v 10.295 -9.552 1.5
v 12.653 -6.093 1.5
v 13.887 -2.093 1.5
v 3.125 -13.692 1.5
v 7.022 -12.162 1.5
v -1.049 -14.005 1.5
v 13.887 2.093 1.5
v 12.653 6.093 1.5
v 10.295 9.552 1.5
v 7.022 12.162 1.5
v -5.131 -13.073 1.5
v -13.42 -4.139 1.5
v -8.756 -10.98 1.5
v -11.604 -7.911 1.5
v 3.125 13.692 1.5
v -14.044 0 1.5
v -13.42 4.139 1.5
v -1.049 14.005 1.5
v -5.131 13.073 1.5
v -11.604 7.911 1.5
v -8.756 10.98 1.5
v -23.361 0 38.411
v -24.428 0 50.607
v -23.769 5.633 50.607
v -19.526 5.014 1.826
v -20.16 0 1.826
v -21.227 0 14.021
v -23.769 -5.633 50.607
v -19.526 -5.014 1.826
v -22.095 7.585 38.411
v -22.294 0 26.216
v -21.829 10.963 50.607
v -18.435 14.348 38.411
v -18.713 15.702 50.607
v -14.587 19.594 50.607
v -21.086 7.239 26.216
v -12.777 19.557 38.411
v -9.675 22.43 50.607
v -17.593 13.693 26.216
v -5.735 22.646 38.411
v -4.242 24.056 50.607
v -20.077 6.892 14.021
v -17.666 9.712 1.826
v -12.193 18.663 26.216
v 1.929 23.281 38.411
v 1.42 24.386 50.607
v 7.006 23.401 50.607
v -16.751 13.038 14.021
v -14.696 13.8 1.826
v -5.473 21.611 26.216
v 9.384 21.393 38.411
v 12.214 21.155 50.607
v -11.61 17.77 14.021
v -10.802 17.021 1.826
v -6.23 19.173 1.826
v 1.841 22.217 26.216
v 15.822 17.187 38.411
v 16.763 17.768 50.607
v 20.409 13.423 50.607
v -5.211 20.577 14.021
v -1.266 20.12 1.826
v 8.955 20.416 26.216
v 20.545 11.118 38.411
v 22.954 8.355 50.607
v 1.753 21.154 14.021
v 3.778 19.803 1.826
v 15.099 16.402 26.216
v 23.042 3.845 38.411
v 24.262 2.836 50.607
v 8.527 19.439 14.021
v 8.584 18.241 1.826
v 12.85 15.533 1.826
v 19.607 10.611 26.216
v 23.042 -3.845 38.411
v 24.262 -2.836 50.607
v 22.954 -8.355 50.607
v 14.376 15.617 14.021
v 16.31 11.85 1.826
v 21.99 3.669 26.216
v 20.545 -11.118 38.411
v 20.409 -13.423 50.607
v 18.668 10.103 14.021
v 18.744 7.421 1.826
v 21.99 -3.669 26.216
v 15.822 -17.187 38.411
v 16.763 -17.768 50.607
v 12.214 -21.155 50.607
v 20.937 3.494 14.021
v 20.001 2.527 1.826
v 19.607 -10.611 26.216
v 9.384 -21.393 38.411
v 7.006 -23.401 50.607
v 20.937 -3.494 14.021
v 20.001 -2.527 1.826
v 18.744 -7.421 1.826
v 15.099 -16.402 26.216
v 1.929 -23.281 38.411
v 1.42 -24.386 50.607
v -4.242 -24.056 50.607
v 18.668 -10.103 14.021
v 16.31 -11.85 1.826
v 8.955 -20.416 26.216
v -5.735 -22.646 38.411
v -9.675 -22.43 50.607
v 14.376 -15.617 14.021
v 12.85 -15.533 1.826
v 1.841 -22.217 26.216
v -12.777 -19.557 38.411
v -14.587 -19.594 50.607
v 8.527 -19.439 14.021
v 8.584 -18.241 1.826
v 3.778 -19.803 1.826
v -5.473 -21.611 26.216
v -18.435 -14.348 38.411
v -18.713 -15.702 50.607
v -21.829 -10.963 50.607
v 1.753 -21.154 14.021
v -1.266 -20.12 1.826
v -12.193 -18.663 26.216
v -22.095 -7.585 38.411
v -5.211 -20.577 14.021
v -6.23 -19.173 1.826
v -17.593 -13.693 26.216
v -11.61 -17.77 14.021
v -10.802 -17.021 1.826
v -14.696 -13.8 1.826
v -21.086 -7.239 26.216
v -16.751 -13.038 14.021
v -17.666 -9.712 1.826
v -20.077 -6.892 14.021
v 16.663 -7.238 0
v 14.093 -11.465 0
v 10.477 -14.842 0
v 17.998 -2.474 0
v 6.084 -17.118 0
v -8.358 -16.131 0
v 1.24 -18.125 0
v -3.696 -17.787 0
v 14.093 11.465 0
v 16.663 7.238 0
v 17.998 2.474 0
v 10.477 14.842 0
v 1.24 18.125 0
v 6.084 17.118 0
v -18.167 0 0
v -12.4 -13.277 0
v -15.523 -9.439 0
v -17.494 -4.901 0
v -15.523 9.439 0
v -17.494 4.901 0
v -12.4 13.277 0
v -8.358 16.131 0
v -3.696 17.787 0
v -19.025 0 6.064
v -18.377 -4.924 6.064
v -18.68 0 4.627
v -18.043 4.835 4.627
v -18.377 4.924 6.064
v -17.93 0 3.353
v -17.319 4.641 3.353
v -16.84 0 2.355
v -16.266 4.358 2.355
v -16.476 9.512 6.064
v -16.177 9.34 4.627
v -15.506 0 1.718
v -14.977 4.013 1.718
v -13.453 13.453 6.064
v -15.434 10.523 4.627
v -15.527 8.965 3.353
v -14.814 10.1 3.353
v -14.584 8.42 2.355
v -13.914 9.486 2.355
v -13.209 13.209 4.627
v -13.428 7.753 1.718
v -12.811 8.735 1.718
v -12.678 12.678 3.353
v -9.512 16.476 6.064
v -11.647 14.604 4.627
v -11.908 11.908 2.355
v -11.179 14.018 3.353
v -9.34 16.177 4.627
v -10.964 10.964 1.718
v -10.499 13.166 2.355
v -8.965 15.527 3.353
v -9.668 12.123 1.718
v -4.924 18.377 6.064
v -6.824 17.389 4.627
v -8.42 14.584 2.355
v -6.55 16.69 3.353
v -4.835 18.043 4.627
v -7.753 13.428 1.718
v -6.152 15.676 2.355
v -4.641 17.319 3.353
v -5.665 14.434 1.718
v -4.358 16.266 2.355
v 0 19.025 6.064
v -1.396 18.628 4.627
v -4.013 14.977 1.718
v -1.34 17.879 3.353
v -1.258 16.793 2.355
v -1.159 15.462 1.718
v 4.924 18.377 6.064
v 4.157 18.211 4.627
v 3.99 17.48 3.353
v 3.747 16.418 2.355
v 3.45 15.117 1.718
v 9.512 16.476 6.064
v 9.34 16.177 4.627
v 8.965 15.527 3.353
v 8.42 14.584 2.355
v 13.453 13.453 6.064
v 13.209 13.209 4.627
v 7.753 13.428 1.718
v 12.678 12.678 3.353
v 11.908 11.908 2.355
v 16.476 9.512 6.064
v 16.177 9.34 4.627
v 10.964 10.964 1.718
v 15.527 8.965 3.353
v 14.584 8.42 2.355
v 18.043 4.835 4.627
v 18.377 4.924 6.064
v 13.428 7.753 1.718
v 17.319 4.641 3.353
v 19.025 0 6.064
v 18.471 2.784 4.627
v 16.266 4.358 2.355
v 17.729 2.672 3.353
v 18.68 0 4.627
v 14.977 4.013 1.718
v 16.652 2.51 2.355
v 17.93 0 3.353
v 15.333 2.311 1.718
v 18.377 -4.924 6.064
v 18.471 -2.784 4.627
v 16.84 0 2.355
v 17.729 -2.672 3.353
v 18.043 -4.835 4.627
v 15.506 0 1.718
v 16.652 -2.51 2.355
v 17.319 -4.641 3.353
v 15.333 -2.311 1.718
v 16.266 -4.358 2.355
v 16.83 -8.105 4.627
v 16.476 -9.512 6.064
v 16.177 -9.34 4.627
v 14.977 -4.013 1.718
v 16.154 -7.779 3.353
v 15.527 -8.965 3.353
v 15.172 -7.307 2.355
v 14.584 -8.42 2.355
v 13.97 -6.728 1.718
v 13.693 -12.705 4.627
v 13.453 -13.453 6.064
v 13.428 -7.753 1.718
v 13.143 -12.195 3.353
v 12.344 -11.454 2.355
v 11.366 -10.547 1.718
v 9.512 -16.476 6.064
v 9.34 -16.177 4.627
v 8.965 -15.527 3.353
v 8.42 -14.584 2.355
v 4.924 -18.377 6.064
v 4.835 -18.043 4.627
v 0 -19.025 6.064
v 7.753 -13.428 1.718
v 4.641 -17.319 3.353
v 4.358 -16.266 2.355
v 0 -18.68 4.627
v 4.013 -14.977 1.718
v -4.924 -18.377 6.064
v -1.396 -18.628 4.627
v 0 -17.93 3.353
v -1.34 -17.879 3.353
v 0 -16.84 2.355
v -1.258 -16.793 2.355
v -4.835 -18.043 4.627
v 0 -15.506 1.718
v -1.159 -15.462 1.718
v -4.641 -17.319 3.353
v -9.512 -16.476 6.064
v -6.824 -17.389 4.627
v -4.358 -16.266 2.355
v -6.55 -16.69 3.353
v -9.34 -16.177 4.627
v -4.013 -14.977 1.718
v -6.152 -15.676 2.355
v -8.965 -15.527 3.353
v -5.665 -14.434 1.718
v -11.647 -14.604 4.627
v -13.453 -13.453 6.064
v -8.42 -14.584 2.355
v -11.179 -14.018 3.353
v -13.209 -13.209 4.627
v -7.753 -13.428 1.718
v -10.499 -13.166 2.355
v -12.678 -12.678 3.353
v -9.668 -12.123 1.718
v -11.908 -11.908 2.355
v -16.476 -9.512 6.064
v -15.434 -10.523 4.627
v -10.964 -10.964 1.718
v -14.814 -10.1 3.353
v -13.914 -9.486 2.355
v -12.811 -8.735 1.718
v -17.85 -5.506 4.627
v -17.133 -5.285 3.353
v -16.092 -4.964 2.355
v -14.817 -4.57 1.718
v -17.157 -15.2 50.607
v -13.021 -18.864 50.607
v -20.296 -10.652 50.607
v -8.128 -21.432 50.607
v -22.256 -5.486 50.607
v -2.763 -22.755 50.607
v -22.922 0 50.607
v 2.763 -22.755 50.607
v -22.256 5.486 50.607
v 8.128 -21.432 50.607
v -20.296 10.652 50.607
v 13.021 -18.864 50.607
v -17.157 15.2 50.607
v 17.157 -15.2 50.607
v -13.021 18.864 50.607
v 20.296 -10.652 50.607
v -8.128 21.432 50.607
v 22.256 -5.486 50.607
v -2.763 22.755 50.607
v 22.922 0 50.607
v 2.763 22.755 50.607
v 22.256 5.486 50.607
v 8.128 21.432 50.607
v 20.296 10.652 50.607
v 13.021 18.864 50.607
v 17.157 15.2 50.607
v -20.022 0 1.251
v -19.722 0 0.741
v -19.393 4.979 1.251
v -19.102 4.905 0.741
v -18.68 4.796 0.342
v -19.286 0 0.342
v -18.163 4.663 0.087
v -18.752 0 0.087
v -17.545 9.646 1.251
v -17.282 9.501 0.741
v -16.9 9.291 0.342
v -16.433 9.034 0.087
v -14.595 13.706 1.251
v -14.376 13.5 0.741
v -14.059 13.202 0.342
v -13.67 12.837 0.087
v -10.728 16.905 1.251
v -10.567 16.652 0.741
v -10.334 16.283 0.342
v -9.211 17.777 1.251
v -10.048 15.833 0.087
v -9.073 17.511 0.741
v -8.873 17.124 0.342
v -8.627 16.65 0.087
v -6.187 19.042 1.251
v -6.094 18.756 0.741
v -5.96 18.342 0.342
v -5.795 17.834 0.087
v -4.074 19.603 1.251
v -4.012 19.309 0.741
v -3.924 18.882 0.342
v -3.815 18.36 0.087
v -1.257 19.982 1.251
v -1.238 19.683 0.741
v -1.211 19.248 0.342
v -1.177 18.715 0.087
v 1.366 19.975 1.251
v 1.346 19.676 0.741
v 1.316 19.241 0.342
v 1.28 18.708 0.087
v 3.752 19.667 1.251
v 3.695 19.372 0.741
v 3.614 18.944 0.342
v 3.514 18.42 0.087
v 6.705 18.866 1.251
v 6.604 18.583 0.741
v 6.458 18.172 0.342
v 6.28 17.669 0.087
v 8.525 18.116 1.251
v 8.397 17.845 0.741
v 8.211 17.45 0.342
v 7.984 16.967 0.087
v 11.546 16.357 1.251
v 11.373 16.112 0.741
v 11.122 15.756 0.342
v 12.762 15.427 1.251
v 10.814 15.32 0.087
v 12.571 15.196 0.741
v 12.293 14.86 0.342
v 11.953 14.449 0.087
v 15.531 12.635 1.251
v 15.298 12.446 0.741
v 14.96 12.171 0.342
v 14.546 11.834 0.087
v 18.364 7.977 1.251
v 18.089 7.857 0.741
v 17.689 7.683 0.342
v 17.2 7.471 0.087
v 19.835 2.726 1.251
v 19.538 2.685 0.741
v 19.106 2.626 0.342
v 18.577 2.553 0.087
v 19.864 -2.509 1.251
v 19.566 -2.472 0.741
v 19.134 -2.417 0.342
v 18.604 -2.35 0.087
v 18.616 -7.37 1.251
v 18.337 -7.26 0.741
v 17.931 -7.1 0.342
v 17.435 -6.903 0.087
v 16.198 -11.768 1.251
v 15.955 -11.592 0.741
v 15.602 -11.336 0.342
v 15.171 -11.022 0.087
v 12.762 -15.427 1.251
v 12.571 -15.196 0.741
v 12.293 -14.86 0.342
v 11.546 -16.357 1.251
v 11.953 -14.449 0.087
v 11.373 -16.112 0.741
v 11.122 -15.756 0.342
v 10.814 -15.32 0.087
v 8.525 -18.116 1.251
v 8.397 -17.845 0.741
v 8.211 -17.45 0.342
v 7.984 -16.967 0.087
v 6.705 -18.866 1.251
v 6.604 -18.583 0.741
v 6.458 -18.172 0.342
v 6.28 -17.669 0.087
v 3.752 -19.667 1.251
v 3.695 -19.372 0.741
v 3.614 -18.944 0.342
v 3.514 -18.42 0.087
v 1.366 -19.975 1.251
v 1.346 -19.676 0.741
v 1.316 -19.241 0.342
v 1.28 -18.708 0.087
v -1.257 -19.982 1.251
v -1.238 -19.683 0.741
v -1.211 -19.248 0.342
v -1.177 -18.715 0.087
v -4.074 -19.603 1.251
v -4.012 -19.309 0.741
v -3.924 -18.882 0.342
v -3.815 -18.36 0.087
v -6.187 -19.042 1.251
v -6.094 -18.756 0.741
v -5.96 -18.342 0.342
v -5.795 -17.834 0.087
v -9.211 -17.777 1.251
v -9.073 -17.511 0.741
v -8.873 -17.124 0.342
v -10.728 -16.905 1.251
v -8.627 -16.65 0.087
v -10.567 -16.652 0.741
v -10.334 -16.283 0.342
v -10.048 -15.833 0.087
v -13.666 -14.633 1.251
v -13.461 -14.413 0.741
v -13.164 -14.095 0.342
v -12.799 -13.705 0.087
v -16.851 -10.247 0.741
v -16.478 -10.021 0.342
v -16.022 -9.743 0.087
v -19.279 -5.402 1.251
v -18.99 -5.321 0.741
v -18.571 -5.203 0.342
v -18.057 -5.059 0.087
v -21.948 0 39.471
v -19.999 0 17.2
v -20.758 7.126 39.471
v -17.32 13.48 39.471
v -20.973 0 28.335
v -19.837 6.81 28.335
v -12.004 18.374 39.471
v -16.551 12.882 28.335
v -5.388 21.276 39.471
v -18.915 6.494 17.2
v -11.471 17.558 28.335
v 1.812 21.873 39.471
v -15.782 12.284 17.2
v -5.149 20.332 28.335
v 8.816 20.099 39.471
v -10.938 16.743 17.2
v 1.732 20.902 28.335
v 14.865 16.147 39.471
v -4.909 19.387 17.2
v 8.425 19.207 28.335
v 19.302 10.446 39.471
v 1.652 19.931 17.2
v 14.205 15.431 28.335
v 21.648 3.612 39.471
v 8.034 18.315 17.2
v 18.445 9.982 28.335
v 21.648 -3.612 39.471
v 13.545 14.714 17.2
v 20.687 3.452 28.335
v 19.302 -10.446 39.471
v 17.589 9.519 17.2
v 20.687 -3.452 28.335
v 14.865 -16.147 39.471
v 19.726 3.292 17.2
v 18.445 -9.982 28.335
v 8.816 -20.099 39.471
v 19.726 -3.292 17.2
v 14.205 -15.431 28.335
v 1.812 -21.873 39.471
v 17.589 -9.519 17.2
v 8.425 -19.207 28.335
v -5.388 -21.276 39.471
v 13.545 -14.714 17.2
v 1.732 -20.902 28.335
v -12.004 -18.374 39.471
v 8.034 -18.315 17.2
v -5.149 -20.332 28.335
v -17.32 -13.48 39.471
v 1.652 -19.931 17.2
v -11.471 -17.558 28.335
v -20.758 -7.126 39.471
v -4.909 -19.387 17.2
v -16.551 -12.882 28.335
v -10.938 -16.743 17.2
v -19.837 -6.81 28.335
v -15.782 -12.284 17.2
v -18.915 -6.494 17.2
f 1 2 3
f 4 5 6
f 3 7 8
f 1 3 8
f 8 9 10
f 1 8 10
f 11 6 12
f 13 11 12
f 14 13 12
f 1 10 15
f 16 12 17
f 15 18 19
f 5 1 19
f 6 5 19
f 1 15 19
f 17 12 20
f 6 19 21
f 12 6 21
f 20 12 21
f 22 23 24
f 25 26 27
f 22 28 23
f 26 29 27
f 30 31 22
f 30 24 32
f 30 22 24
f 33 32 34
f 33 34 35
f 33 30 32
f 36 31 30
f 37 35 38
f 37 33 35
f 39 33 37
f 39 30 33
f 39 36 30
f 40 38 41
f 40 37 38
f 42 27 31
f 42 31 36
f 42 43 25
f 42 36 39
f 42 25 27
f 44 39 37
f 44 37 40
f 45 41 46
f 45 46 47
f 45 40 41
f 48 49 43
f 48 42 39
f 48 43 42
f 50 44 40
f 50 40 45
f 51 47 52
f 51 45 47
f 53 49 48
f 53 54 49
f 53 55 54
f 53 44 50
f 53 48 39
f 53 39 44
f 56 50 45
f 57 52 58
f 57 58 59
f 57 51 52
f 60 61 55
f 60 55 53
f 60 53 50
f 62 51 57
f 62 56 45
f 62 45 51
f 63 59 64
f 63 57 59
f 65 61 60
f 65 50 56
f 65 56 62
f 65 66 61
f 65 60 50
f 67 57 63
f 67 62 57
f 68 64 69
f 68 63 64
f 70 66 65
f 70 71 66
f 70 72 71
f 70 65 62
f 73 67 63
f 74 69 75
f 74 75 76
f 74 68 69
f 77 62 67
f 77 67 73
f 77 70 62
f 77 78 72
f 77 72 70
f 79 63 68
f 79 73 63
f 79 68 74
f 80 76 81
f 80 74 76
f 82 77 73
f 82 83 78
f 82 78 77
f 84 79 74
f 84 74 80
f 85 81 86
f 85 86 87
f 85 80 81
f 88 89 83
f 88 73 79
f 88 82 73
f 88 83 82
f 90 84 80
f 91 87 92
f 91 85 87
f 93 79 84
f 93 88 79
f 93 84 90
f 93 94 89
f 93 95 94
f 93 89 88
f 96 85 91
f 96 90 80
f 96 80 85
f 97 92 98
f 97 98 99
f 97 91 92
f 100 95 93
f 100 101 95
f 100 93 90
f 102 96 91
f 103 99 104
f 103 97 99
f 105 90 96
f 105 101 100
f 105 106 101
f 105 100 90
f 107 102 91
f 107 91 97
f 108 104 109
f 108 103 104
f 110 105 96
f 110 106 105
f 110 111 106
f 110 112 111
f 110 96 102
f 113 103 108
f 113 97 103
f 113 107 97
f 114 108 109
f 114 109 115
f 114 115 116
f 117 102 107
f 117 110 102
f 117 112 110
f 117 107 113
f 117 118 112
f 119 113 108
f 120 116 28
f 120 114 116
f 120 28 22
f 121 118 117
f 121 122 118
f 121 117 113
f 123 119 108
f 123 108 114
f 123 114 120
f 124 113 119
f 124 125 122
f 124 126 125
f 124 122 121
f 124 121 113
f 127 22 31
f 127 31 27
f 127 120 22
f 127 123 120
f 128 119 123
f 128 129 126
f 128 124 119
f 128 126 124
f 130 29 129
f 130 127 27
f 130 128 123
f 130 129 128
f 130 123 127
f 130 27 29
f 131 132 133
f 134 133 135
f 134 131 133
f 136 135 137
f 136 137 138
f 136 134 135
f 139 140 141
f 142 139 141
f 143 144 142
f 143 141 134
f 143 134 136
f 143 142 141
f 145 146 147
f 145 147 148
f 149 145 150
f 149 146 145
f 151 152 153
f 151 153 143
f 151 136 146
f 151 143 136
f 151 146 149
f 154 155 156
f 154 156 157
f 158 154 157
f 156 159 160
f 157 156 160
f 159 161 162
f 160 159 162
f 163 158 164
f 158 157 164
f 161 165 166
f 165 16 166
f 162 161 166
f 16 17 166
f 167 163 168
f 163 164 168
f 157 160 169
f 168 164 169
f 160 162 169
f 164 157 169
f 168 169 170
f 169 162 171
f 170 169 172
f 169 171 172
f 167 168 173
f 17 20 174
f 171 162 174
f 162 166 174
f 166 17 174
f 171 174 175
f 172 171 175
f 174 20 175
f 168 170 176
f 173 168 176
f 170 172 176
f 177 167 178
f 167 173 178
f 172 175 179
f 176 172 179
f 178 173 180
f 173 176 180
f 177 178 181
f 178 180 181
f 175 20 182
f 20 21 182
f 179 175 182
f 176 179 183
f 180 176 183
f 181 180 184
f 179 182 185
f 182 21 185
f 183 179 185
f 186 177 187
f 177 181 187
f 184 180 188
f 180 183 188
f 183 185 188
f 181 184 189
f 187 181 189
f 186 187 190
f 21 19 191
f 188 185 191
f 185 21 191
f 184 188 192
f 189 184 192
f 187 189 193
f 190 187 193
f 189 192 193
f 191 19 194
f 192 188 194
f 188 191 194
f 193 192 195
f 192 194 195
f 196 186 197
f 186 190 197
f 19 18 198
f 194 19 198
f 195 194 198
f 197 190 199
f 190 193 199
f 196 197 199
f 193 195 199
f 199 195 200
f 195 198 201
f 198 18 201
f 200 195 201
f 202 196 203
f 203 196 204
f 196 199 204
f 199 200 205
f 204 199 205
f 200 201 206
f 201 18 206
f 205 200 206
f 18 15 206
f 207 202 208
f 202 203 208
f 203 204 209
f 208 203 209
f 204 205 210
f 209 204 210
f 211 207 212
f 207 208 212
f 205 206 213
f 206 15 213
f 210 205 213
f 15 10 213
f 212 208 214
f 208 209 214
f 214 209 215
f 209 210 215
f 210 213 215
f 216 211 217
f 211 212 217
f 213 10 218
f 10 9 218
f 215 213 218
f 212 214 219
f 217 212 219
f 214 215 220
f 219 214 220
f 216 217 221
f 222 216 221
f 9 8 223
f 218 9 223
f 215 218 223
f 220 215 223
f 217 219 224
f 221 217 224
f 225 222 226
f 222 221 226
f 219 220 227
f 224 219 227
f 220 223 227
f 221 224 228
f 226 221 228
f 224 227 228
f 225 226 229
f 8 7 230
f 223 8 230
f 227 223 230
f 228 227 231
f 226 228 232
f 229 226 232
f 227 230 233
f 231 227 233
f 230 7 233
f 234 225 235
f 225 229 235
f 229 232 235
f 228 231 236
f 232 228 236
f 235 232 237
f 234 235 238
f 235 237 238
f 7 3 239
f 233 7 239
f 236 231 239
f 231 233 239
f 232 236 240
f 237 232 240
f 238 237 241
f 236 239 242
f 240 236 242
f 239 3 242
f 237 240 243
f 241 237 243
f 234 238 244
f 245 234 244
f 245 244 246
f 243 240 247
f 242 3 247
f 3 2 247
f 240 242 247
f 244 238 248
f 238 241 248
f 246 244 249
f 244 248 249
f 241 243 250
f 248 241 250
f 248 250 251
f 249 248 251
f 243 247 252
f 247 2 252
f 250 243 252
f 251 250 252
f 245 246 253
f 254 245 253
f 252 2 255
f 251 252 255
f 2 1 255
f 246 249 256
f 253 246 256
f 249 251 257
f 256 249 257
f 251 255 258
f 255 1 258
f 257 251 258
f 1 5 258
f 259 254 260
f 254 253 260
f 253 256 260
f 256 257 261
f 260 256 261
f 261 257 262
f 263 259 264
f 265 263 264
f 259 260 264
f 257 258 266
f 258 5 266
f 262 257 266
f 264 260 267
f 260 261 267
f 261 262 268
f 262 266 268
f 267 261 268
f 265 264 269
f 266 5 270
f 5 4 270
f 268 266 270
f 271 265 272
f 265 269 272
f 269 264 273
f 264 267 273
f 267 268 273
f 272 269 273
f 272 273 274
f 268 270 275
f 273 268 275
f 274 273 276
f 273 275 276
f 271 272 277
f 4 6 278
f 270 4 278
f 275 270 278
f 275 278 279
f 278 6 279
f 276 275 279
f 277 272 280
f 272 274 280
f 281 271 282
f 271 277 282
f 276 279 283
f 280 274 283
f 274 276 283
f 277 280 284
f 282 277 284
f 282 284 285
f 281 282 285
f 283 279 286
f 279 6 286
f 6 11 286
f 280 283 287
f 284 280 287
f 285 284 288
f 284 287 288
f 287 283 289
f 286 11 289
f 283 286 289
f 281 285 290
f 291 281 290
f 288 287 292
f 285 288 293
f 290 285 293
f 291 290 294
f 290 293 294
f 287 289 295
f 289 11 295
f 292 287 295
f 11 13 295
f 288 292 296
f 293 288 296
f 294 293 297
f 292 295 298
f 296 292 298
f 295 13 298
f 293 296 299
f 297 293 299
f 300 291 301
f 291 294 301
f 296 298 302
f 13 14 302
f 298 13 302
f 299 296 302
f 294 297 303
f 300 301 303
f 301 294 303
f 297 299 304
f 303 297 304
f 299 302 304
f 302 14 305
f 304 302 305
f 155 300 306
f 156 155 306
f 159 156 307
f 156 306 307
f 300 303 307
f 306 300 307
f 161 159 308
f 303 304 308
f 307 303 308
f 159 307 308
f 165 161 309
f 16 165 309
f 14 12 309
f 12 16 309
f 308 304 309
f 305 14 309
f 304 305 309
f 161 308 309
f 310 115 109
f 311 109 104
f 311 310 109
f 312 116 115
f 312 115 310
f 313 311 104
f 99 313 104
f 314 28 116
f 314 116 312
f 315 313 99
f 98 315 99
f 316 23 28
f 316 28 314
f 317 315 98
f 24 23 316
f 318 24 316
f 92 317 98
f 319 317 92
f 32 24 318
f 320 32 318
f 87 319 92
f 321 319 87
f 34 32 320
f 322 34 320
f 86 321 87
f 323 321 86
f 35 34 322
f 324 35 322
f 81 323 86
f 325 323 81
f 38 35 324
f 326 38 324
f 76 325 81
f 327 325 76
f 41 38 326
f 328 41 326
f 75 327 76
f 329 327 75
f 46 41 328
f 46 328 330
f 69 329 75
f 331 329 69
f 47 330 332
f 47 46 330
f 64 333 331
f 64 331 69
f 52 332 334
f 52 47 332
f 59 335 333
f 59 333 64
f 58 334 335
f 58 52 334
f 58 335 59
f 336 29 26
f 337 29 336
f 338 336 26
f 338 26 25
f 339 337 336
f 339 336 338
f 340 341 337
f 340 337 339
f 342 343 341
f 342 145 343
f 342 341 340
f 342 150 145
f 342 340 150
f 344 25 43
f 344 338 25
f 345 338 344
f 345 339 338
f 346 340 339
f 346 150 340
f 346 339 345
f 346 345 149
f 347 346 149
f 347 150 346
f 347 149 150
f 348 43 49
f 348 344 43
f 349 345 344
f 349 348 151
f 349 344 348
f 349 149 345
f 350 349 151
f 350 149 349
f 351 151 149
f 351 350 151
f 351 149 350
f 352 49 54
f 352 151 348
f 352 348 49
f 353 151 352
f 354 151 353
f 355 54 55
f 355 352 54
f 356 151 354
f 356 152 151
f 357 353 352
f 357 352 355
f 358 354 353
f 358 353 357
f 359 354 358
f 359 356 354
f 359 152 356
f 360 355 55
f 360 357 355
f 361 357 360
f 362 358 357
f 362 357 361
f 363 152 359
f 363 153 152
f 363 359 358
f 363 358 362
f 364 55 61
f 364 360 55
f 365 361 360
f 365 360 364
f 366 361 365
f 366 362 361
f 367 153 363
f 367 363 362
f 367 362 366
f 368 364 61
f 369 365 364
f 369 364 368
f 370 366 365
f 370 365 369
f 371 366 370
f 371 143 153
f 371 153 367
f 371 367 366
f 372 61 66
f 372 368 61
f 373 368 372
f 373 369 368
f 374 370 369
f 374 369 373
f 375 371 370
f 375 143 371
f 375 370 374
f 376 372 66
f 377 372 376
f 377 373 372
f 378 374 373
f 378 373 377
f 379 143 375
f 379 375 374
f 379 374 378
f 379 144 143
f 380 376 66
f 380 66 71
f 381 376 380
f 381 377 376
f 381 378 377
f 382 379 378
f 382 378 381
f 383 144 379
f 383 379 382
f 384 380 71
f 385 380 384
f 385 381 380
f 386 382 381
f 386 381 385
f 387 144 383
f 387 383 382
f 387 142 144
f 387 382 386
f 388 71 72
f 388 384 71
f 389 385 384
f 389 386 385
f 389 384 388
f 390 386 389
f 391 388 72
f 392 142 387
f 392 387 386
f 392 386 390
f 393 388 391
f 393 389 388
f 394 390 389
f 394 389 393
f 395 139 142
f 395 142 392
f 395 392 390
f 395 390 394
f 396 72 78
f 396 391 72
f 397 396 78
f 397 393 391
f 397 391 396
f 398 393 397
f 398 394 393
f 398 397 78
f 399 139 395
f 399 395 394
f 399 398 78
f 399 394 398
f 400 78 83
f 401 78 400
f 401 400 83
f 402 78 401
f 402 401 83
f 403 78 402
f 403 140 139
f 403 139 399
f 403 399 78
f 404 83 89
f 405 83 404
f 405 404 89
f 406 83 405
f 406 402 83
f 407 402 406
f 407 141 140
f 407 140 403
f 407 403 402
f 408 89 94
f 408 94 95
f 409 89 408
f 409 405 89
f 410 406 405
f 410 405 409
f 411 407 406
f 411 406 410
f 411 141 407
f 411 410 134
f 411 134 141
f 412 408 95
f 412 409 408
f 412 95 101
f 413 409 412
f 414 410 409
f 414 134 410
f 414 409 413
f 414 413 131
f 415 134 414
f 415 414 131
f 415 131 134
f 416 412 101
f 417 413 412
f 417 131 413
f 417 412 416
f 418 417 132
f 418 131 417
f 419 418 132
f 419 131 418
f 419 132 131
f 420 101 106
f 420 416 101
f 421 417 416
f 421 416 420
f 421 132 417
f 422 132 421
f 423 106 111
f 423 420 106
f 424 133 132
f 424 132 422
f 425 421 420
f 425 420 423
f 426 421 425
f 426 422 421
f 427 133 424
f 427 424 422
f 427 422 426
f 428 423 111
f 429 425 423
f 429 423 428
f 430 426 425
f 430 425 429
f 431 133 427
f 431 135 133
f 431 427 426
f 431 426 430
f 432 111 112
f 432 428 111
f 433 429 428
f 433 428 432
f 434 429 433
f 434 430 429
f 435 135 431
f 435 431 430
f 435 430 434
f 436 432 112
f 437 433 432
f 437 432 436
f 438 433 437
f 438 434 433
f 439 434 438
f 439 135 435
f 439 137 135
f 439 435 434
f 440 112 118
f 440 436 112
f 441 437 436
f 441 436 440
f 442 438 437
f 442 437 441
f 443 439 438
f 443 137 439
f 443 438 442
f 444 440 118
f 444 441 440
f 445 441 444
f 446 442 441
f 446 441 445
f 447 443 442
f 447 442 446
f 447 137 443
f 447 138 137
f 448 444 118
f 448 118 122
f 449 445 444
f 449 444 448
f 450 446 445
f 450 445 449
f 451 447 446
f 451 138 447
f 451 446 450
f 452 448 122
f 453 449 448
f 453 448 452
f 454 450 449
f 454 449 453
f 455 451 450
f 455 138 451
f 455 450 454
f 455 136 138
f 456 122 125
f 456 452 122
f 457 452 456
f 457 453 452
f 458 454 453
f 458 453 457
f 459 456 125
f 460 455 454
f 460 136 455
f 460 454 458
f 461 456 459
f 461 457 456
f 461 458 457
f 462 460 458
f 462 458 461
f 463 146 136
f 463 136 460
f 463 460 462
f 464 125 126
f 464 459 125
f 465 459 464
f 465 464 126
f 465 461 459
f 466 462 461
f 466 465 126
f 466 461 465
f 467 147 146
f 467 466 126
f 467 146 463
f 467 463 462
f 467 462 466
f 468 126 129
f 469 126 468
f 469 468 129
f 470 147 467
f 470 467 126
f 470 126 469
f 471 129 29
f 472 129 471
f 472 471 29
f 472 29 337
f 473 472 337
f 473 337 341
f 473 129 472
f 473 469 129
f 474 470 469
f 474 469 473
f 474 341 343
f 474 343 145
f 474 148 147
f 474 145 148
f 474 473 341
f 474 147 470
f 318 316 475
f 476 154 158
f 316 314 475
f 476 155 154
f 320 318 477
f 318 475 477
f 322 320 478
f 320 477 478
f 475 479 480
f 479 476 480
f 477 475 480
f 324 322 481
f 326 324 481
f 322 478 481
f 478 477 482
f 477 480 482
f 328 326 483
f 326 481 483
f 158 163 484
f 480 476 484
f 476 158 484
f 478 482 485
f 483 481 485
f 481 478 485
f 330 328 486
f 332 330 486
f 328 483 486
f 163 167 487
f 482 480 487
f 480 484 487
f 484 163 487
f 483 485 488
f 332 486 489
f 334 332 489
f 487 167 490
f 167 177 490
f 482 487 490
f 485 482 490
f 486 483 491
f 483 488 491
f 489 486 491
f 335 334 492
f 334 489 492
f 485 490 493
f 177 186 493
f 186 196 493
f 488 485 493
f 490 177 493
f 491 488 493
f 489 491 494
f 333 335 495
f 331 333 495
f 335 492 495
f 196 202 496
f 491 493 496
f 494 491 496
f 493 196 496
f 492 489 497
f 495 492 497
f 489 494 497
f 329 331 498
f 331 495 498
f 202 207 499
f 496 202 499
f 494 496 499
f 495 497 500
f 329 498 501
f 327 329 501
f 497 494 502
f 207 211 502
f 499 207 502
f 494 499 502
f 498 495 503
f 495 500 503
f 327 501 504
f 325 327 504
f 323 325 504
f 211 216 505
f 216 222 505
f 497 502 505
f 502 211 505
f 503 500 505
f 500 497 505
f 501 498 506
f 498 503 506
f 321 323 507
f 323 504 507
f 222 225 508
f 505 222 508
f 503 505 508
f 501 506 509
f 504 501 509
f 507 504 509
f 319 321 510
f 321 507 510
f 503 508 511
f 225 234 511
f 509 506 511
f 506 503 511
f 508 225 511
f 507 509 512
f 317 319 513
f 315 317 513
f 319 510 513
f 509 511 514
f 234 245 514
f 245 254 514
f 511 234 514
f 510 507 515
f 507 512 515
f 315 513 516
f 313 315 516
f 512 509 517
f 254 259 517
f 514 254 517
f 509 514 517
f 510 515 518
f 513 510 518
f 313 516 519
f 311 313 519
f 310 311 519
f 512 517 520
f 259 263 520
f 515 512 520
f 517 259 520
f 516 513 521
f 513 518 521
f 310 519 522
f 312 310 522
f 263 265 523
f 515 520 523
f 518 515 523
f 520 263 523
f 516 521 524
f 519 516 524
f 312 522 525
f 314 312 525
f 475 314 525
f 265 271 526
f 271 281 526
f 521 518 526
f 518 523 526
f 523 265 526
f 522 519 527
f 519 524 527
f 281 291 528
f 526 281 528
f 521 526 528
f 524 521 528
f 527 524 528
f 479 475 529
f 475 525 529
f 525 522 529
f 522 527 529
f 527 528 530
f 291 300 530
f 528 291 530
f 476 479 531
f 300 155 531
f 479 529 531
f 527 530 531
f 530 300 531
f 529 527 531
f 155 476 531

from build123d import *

# Parameters (mm, degrees)
F1_T = -1.5
F2_R = 5
F4_R = 2


with BuildPart() as f3:
    # F0 (on Front) → F3 (revolve)
    with BuildSketch(Plane.XZ):
        Polygon((-20, 0), (0, 0), (0, 50.6066906631), (-24.4275117316, 50.6066906631), align=None)
    revolve(axis=Axis((0, 0, 25.3033453315), (0, 0, -1)))

    # F1
    f1_openings = [f3.faces().sort_by_distance(p)[0] for p in [
        (0, 0, 50.606691),
    ]]
    offset(amount=F1_T, openings=f1_openings)

    # F2
    f2_edges = [f3.edges().sort_by_distance(p)[0] for p in [
        (18.625503, 0, 1.5),
    ]]
    fillet(f2_edges, radius=F2_R)

    # F4
    f4_edges = [f3.edges().sort_by_distance(p)[0] for p in [
        (20, 0, 0),
    ]]
    fillet(f4_edges, radius=F4_R)


solid = f3.part
